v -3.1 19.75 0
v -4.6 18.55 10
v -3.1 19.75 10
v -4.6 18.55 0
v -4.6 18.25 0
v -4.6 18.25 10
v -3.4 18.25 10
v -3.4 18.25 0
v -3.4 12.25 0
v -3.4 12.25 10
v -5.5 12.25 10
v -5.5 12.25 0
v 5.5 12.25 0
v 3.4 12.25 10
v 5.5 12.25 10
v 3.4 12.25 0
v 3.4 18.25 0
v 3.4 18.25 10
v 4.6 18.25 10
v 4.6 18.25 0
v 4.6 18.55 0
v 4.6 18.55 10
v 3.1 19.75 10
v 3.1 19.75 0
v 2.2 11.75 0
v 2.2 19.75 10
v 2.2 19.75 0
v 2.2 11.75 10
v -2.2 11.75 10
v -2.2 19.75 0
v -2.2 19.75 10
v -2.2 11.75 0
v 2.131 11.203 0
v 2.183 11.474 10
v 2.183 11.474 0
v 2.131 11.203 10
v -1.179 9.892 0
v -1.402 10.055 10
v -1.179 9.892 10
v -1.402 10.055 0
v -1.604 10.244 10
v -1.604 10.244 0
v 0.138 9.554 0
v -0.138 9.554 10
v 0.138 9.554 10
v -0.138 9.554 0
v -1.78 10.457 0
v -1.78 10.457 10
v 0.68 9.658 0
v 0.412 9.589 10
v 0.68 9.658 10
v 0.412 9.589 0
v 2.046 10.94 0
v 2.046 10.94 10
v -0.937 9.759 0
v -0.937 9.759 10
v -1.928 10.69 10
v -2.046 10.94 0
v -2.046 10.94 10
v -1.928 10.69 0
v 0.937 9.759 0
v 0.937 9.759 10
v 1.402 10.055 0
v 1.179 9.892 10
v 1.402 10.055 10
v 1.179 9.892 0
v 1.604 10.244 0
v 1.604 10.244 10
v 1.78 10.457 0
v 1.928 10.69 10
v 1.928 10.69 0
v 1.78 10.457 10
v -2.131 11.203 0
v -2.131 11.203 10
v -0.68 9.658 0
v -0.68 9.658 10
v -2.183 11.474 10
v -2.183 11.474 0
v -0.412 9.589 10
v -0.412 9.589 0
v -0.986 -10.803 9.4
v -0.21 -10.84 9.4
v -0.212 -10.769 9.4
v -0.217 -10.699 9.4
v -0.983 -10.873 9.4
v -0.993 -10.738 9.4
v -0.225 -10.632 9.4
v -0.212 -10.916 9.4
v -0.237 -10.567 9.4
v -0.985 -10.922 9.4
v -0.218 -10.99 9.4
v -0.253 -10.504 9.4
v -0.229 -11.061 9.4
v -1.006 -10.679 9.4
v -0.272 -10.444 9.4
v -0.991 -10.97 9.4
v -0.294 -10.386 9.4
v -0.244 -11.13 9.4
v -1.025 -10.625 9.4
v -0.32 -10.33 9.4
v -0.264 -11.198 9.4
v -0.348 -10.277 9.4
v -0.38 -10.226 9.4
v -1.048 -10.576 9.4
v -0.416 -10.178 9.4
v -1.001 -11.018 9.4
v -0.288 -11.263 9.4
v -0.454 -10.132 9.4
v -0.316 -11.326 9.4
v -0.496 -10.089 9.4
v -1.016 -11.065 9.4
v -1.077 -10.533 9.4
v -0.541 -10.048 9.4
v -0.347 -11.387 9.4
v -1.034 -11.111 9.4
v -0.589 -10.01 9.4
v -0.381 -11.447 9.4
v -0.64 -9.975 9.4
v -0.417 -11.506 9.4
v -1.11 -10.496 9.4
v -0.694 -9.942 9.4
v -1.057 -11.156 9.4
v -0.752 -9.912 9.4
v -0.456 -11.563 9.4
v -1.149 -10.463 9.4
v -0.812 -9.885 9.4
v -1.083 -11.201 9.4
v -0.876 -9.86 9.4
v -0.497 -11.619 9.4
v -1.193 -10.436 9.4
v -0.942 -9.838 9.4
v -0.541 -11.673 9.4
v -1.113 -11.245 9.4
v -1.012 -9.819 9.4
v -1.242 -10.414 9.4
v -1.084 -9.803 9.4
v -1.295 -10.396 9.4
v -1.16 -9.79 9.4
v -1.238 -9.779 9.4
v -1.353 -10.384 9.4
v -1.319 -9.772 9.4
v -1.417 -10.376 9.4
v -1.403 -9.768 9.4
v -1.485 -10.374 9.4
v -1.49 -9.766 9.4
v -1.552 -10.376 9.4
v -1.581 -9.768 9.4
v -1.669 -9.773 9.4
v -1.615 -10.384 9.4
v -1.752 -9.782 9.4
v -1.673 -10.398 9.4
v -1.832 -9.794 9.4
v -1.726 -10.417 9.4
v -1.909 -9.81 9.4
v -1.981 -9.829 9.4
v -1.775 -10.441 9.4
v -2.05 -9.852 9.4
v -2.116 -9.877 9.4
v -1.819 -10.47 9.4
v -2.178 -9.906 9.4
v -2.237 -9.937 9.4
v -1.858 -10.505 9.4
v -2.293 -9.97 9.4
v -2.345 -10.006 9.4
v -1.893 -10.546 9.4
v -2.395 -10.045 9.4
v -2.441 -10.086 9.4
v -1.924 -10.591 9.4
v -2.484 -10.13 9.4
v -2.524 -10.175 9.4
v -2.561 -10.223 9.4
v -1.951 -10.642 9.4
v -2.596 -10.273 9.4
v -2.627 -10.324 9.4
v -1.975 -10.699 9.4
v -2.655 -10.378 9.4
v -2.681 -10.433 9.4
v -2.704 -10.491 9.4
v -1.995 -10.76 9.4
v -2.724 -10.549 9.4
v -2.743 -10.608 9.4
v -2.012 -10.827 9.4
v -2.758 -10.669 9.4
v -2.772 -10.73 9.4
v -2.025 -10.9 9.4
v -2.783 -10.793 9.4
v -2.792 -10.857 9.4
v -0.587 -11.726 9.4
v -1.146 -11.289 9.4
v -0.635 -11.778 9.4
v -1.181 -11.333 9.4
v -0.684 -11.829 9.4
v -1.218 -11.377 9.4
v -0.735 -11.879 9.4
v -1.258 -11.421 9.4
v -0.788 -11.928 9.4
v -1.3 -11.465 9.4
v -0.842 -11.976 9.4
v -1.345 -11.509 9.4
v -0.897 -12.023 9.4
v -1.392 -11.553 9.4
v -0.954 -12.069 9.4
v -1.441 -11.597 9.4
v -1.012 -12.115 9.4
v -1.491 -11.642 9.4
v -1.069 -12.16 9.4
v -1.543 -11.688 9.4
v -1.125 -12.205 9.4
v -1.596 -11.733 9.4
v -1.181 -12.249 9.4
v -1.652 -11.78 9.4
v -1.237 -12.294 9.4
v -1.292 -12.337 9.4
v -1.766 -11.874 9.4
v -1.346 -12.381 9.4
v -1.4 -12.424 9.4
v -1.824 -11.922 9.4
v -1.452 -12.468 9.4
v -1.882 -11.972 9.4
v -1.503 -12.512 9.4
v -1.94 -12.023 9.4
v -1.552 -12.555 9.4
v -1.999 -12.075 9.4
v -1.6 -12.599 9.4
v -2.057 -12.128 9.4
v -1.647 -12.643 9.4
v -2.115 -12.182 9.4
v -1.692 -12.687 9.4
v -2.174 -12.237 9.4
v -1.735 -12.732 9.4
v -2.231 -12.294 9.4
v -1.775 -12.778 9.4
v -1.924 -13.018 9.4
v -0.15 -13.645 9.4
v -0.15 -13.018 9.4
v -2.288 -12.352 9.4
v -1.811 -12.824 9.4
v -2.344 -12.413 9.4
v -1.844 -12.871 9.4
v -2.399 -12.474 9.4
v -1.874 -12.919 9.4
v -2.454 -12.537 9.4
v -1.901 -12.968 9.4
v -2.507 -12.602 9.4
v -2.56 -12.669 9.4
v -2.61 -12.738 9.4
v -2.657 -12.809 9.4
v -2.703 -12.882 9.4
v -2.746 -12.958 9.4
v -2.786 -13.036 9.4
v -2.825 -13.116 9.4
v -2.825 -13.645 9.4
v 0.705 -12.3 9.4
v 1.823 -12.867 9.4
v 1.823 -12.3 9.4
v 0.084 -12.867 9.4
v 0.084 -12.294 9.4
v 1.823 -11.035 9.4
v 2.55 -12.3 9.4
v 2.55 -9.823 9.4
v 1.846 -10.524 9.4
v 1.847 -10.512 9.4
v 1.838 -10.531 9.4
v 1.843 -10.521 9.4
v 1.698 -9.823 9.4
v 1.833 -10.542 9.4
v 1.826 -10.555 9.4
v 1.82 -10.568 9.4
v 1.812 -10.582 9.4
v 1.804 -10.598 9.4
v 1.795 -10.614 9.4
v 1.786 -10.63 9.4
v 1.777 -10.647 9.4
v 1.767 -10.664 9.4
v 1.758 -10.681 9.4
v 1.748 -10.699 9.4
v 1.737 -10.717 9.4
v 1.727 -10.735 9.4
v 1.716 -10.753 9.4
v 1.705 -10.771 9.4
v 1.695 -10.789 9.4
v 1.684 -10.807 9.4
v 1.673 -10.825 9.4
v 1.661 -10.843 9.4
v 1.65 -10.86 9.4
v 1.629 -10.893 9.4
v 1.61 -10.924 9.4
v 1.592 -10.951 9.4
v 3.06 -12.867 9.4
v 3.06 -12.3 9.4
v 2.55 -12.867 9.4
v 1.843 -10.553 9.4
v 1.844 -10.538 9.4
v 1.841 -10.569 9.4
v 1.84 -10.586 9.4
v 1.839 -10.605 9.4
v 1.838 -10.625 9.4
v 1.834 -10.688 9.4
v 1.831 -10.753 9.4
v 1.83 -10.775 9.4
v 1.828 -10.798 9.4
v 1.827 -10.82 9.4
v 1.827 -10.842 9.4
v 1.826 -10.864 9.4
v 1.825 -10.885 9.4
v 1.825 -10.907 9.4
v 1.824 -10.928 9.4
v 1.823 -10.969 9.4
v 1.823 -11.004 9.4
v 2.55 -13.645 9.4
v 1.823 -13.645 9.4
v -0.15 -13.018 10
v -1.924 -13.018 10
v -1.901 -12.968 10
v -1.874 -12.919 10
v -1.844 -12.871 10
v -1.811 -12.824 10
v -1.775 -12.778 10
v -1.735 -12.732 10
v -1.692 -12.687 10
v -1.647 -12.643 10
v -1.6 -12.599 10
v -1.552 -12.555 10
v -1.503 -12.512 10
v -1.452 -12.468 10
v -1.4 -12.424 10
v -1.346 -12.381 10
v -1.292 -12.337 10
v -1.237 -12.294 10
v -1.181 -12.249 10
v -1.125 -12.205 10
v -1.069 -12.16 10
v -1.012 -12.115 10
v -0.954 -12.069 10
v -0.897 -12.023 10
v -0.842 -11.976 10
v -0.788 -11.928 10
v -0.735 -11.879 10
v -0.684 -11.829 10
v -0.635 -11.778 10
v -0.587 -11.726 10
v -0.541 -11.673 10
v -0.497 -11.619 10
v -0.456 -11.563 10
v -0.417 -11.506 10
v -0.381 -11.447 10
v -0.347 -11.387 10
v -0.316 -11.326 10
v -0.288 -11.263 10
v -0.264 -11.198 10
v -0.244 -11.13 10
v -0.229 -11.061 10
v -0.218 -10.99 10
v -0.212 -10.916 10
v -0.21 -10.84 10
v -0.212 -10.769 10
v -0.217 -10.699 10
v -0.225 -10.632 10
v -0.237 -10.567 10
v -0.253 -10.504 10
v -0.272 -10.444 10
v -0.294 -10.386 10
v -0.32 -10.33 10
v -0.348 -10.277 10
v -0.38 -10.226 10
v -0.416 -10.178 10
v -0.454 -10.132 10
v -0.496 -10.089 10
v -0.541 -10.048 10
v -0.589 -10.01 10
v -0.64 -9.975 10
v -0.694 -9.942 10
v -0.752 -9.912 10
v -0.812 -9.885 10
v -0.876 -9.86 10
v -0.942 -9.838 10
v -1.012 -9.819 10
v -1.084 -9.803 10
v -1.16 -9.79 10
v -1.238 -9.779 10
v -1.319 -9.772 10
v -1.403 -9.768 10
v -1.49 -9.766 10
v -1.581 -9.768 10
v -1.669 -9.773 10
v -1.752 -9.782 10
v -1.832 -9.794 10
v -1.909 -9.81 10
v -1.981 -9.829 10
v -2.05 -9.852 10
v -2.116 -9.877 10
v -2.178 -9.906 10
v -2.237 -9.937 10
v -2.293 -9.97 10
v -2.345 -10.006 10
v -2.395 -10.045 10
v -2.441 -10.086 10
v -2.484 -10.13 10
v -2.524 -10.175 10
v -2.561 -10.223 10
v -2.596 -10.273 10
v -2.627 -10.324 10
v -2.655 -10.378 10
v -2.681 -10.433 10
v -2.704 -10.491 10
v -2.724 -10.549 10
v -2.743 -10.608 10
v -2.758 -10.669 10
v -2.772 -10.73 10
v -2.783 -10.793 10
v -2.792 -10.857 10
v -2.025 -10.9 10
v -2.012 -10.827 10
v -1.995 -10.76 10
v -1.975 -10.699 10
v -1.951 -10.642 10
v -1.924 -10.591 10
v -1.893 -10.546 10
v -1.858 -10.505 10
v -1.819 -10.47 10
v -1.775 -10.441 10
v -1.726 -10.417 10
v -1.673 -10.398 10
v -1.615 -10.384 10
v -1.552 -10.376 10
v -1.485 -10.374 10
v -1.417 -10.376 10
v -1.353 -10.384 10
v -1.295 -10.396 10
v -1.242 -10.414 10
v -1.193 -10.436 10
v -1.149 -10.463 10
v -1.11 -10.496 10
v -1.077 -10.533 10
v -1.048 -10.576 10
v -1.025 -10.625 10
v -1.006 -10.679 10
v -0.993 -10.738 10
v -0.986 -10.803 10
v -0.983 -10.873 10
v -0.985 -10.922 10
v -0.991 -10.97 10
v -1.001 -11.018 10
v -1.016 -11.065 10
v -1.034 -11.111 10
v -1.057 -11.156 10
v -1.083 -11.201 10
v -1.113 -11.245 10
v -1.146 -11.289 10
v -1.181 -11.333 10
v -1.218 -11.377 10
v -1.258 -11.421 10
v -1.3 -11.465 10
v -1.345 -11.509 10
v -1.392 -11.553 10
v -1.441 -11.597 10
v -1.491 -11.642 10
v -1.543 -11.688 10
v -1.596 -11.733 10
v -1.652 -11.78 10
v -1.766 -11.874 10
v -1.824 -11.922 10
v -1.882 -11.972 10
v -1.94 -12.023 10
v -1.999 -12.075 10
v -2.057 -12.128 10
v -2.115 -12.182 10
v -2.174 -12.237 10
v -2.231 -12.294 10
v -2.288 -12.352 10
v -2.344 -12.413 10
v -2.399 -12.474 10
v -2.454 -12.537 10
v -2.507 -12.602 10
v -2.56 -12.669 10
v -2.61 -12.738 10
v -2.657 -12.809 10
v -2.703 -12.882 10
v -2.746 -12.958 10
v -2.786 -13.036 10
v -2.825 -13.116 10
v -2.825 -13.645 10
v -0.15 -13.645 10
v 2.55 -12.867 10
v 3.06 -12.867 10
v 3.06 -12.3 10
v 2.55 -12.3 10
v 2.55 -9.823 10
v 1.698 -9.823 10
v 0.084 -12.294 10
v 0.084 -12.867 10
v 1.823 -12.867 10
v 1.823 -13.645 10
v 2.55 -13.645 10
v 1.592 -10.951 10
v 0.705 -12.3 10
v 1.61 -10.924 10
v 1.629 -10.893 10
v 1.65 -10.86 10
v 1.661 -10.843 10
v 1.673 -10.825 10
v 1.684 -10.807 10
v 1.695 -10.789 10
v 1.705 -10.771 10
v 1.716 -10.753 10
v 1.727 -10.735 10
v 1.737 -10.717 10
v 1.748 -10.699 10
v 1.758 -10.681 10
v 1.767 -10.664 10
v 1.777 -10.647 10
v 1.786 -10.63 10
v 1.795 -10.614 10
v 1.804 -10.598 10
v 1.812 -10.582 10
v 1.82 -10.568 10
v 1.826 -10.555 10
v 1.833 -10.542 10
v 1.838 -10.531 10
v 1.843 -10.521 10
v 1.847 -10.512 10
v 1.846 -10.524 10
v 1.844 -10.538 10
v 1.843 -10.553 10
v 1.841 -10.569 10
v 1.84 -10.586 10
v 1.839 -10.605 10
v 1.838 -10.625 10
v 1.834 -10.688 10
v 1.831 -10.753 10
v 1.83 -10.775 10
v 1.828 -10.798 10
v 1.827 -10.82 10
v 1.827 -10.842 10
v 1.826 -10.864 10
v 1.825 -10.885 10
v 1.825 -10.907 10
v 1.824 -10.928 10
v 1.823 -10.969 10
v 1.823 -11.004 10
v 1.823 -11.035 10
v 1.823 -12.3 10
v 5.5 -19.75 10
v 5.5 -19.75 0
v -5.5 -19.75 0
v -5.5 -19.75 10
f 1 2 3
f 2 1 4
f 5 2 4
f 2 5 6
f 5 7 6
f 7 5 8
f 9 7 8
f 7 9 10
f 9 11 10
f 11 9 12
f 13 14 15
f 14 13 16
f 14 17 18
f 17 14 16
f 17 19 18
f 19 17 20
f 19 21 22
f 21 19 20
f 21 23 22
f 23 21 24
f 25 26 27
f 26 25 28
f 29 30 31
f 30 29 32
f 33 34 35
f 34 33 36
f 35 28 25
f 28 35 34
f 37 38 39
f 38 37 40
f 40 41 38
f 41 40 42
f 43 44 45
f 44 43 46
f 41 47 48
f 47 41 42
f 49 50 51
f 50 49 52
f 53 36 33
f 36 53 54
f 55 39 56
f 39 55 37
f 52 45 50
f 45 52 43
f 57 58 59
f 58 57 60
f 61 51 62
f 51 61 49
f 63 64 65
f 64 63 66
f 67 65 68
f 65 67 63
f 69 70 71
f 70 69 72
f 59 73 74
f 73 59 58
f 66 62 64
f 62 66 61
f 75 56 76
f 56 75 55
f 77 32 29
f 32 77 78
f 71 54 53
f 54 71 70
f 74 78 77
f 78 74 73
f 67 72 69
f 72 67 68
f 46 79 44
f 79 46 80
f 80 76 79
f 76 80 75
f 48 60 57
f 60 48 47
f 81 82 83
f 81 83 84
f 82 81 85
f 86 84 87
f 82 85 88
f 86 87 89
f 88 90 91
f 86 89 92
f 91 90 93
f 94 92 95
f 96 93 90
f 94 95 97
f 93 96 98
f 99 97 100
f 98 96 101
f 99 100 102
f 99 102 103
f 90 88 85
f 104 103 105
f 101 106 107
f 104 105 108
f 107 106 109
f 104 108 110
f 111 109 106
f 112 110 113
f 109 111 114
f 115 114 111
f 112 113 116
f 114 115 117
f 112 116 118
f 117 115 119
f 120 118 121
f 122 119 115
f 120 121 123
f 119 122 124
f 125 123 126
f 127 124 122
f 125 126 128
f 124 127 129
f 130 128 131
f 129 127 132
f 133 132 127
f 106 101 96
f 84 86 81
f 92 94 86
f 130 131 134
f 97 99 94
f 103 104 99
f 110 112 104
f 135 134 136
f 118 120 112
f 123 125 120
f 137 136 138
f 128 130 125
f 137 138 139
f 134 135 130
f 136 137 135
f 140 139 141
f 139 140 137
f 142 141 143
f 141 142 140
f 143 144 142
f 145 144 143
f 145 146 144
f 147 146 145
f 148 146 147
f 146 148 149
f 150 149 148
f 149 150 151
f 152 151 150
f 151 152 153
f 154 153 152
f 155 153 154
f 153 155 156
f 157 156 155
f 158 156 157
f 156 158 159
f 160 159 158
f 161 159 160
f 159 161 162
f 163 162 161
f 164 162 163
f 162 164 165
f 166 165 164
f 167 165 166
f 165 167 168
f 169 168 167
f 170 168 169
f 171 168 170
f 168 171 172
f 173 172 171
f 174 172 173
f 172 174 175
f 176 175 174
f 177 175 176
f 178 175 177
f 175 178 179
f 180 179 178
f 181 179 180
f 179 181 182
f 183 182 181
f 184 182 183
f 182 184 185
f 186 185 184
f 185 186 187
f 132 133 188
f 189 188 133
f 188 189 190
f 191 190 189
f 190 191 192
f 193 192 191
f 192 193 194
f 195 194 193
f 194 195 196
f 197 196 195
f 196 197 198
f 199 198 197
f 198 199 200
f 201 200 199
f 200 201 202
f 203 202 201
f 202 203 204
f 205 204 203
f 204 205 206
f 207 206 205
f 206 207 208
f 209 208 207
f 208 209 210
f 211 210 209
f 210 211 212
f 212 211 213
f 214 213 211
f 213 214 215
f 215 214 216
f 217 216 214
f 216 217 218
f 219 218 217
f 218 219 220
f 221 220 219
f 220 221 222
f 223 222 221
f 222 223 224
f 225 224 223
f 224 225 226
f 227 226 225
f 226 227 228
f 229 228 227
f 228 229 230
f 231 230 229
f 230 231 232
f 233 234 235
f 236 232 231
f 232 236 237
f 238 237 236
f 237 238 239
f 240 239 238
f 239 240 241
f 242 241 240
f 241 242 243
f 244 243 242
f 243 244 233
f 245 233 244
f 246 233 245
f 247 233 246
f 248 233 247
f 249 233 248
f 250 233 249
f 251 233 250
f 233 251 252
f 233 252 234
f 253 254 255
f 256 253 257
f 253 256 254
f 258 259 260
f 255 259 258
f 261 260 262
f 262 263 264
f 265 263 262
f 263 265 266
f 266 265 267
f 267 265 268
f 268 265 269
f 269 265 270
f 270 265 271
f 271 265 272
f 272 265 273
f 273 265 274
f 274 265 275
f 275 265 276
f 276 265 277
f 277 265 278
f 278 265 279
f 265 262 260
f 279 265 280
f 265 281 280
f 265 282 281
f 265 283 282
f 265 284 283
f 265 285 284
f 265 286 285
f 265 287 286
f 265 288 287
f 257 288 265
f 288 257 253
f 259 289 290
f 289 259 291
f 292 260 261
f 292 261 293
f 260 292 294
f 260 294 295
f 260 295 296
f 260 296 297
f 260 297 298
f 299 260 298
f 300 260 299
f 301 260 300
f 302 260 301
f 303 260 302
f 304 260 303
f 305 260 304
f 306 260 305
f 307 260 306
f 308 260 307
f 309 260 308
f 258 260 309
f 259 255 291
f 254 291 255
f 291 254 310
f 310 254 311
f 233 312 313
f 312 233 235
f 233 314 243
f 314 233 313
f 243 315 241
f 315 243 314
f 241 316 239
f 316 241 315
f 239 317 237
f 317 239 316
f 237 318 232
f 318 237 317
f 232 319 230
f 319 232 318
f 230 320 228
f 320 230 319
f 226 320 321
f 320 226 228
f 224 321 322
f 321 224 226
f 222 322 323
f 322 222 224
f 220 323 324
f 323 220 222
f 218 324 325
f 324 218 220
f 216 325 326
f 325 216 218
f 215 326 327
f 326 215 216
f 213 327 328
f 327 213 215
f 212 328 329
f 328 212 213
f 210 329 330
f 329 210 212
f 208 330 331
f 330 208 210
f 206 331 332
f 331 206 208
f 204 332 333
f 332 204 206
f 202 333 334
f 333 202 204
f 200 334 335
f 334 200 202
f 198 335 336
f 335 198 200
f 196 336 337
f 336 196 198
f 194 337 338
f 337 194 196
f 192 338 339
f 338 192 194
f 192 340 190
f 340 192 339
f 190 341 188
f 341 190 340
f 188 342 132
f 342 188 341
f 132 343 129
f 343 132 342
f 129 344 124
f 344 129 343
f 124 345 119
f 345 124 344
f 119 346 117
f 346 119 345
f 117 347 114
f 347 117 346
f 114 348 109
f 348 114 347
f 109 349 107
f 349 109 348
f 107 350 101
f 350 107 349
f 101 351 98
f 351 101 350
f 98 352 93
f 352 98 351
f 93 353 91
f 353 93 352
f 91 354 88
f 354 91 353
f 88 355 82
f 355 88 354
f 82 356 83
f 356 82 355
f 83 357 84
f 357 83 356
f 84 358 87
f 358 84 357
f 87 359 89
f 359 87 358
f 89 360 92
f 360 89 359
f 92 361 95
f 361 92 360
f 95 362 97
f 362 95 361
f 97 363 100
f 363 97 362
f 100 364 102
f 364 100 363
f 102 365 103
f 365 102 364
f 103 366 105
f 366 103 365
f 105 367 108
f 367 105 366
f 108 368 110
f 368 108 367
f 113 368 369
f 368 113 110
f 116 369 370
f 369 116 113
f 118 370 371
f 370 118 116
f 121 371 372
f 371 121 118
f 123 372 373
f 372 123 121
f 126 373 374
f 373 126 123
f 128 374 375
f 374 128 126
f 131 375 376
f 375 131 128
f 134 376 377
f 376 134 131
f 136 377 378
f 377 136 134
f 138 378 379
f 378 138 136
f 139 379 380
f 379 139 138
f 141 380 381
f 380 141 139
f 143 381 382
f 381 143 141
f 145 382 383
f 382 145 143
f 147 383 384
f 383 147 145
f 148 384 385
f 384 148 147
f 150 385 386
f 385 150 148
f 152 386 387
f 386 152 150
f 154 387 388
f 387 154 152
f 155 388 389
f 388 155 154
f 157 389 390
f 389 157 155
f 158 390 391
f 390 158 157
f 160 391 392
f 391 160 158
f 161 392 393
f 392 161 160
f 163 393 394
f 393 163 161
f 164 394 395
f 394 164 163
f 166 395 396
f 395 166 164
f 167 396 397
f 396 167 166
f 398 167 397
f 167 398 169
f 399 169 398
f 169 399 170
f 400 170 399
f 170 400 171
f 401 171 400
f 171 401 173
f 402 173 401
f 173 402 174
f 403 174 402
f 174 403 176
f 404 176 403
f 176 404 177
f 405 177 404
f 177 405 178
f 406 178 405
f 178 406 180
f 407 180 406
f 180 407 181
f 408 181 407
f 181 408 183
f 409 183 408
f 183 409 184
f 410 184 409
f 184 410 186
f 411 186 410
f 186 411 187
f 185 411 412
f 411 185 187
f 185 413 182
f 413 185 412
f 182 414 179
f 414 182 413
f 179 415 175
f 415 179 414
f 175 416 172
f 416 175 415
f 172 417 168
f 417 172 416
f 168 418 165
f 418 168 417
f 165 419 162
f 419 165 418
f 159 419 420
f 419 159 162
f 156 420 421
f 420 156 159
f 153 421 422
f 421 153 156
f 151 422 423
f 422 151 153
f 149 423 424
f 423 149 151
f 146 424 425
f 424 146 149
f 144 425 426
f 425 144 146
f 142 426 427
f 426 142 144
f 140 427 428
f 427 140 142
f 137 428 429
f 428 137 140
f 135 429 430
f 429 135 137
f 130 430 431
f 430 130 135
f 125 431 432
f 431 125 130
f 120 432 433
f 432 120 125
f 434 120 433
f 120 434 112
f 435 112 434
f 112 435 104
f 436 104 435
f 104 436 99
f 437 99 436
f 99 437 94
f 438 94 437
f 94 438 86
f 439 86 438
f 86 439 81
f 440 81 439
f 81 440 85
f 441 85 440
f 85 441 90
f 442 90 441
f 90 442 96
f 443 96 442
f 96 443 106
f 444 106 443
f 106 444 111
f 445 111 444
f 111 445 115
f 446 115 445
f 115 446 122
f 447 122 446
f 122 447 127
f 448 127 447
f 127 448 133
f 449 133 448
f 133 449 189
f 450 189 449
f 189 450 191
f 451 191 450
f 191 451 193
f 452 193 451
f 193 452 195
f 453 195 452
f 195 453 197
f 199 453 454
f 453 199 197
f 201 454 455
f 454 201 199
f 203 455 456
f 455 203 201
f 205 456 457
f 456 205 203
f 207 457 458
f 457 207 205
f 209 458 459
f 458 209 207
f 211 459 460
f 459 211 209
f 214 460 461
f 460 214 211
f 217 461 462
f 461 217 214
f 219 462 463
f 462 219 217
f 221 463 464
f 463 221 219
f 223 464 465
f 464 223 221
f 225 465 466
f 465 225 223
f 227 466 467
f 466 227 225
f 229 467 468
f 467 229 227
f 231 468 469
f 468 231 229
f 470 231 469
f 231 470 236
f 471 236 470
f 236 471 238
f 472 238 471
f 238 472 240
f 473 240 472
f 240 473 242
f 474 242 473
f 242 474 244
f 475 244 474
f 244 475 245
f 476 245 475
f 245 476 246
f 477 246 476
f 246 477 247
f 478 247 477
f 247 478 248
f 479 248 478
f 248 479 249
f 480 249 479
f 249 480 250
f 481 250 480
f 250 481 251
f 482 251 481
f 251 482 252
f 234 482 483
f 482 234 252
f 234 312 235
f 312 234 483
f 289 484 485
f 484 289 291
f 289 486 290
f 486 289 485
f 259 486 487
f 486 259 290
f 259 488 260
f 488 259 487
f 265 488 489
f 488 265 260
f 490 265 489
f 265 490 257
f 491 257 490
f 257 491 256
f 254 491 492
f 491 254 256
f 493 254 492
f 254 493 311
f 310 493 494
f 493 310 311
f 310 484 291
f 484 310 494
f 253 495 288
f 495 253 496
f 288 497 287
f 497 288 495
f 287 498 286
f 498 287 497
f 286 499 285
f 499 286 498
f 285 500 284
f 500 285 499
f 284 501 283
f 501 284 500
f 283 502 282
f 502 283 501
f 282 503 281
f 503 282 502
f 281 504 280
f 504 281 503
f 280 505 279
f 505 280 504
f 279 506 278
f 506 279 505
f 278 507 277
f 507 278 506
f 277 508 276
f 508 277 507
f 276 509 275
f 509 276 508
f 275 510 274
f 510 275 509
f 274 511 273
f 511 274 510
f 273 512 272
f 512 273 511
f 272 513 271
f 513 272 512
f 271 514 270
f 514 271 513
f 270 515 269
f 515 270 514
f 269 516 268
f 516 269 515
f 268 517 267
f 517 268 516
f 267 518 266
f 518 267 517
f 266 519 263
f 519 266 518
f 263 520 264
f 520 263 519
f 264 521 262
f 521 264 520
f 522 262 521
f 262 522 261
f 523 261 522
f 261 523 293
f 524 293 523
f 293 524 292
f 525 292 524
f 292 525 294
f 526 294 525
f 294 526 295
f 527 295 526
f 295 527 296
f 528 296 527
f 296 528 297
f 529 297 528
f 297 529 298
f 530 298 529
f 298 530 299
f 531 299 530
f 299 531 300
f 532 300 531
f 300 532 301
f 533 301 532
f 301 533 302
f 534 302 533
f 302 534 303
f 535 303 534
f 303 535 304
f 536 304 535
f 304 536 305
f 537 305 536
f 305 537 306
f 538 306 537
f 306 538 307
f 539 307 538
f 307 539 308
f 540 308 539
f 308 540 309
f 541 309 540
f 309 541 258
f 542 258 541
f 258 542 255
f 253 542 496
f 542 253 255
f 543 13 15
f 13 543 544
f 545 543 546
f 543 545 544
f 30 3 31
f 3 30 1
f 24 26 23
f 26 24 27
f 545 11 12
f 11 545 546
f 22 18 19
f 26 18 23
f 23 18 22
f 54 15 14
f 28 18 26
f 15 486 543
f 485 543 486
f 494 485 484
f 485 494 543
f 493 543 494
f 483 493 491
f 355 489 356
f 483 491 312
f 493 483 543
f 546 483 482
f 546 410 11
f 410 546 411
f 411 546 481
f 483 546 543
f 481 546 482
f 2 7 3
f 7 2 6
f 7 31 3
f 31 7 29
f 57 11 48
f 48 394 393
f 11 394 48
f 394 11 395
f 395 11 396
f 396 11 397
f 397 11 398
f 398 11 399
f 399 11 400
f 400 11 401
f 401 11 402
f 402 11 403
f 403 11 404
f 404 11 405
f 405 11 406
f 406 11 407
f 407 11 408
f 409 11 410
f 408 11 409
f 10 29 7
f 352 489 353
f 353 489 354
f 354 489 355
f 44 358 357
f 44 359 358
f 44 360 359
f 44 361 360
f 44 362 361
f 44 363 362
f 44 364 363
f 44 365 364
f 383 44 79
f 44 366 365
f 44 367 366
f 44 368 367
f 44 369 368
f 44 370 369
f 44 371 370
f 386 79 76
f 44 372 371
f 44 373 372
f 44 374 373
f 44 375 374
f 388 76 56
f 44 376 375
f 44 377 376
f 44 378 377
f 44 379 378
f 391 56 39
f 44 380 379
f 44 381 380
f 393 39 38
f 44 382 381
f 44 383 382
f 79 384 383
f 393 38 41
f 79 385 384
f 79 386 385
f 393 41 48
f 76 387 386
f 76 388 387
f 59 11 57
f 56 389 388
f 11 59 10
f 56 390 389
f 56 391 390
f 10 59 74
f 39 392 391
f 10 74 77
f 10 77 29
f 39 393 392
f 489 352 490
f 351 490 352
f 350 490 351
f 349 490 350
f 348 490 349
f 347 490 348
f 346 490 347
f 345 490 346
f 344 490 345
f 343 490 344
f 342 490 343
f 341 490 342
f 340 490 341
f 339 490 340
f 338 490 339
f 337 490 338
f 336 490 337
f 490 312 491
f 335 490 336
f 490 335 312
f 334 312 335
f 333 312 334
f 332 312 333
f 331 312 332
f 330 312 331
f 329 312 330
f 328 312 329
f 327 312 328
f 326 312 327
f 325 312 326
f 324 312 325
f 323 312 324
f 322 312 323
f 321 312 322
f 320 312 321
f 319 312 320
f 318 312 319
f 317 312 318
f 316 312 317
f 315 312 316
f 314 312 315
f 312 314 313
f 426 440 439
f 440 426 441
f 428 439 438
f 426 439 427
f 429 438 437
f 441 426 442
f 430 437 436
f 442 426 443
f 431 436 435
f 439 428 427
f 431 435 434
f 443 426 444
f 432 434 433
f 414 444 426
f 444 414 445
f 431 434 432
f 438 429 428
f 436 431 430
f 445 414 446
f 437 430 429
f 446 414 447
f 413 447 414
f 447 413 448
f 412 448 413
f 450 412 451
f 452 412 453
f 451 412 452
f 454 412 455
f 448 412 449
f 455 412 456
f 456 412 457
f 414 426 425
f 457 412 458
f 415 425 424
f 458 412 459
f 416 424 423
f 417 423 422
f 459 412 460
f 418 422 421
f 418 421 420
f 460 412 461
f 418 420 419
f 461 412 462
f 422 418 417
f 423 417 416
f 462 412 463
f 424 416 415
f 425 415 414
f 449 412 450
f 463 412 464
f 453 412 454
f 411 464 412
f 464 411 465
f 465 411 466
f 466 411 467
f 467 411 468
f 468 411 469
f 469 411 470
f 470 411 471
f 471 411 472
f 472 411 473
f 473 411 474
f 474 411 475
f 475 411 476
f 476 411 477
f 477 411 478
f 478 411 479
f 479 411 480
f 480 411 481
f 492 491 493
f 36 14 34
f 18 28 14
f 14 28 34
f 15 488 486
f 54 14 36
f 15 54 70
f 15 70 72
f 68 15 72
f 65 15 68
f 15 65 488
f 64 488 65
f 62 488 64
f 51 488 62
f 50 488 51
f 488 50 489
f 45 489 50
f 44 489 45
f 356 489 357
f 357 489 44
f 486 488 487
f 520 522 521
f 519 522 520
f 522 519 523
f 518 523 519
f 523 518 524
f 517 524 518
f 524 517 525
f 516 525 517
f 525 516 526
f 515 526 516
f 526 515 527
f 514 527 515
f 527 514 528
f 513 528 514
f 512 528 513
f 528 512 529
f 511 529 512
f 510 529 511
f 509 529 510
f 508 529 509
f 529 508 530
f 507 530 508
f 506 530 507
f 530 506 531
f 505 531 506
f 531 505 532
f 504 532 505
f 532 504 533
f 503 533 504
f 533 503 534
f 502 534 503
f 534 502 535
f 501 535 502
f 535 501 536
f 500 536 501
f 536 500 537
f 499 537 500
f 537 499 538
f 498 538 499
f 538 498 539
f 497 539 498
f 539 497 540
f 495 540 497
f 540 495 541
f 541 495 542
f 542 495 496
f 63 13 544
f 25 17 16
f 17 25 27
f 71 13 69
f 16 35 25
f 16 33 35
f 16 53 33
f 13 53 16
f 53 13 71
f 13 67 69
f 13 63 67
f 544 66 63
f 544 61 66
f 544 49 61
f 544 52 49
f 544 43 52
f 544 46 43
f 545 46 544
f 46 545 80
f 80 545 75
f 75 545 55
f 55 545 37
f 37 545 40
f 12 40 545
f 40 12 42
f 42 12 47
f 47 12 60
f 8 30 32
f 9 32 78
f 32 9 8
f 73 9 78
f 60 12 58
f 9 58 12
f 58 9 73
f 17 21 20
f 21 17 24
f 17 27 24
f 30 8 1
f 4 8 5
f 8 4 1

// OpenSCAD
$fn = 50;

difference() {
	union() {
		translate(v = [0, 12.25, 0]) {
			rotate(a = [90, 0, 0]) {
				difference() {
					union() {
						translate(v = [-5.5, 0, -7.5]) {
							cube(size = [11.0, 10.0, 39.5]);
						}
					}
					union() {
						translate(v = [0, 10.1, 0]) {
							rotate(a = [90, 0, 0]) {
								linear_extrude(height = 10.2) {
									polygon(points = [[-3.1, -7.6], [-3.1, -7.5], [-4.6, -6.3], [-4.6, -6.0], [-3.4, -6.0], [-3.4, 0], [-5.6, 0], [-5.6, -7.6]]);
								}
							}
						}
						translate(v = [0, 10.1, 0]) {
							rotate(a = [90, 0, 0]) {
								linear_extrude(height = 10.2) {
									polygon(points = [[3.1, -7.6], [3.1, -7.5], [4.6, -6.3], [4.6, -6.0], [3.4, -6.0], [3.4, 0], [5.6, 0], [5.6, -7.6]]);
								}
							}
						}
						translate(v = [-2.2, -0.1, -7.6]) {
							cube(size = [4.4, 10.2, 8.1]);
						}
						translate(v = [0, 10.1, 0.5]) {
							rotate(a = [90, 0, 0]) {
								cylinder(h = 10.2, r = 2.2);
							}
						}
						translate(v = [0, 9.4, 24.0]) {
							rotate(a = [-90, 0, 0]) {
								linear_extrude(height = 0.7) {
									text(font = "Arial:style=Bold", halign = "center", size = 4.0, text = "24", valign = "center");
								}
							}
						}
					}
				}
			}
		}
	}
	union();
}
